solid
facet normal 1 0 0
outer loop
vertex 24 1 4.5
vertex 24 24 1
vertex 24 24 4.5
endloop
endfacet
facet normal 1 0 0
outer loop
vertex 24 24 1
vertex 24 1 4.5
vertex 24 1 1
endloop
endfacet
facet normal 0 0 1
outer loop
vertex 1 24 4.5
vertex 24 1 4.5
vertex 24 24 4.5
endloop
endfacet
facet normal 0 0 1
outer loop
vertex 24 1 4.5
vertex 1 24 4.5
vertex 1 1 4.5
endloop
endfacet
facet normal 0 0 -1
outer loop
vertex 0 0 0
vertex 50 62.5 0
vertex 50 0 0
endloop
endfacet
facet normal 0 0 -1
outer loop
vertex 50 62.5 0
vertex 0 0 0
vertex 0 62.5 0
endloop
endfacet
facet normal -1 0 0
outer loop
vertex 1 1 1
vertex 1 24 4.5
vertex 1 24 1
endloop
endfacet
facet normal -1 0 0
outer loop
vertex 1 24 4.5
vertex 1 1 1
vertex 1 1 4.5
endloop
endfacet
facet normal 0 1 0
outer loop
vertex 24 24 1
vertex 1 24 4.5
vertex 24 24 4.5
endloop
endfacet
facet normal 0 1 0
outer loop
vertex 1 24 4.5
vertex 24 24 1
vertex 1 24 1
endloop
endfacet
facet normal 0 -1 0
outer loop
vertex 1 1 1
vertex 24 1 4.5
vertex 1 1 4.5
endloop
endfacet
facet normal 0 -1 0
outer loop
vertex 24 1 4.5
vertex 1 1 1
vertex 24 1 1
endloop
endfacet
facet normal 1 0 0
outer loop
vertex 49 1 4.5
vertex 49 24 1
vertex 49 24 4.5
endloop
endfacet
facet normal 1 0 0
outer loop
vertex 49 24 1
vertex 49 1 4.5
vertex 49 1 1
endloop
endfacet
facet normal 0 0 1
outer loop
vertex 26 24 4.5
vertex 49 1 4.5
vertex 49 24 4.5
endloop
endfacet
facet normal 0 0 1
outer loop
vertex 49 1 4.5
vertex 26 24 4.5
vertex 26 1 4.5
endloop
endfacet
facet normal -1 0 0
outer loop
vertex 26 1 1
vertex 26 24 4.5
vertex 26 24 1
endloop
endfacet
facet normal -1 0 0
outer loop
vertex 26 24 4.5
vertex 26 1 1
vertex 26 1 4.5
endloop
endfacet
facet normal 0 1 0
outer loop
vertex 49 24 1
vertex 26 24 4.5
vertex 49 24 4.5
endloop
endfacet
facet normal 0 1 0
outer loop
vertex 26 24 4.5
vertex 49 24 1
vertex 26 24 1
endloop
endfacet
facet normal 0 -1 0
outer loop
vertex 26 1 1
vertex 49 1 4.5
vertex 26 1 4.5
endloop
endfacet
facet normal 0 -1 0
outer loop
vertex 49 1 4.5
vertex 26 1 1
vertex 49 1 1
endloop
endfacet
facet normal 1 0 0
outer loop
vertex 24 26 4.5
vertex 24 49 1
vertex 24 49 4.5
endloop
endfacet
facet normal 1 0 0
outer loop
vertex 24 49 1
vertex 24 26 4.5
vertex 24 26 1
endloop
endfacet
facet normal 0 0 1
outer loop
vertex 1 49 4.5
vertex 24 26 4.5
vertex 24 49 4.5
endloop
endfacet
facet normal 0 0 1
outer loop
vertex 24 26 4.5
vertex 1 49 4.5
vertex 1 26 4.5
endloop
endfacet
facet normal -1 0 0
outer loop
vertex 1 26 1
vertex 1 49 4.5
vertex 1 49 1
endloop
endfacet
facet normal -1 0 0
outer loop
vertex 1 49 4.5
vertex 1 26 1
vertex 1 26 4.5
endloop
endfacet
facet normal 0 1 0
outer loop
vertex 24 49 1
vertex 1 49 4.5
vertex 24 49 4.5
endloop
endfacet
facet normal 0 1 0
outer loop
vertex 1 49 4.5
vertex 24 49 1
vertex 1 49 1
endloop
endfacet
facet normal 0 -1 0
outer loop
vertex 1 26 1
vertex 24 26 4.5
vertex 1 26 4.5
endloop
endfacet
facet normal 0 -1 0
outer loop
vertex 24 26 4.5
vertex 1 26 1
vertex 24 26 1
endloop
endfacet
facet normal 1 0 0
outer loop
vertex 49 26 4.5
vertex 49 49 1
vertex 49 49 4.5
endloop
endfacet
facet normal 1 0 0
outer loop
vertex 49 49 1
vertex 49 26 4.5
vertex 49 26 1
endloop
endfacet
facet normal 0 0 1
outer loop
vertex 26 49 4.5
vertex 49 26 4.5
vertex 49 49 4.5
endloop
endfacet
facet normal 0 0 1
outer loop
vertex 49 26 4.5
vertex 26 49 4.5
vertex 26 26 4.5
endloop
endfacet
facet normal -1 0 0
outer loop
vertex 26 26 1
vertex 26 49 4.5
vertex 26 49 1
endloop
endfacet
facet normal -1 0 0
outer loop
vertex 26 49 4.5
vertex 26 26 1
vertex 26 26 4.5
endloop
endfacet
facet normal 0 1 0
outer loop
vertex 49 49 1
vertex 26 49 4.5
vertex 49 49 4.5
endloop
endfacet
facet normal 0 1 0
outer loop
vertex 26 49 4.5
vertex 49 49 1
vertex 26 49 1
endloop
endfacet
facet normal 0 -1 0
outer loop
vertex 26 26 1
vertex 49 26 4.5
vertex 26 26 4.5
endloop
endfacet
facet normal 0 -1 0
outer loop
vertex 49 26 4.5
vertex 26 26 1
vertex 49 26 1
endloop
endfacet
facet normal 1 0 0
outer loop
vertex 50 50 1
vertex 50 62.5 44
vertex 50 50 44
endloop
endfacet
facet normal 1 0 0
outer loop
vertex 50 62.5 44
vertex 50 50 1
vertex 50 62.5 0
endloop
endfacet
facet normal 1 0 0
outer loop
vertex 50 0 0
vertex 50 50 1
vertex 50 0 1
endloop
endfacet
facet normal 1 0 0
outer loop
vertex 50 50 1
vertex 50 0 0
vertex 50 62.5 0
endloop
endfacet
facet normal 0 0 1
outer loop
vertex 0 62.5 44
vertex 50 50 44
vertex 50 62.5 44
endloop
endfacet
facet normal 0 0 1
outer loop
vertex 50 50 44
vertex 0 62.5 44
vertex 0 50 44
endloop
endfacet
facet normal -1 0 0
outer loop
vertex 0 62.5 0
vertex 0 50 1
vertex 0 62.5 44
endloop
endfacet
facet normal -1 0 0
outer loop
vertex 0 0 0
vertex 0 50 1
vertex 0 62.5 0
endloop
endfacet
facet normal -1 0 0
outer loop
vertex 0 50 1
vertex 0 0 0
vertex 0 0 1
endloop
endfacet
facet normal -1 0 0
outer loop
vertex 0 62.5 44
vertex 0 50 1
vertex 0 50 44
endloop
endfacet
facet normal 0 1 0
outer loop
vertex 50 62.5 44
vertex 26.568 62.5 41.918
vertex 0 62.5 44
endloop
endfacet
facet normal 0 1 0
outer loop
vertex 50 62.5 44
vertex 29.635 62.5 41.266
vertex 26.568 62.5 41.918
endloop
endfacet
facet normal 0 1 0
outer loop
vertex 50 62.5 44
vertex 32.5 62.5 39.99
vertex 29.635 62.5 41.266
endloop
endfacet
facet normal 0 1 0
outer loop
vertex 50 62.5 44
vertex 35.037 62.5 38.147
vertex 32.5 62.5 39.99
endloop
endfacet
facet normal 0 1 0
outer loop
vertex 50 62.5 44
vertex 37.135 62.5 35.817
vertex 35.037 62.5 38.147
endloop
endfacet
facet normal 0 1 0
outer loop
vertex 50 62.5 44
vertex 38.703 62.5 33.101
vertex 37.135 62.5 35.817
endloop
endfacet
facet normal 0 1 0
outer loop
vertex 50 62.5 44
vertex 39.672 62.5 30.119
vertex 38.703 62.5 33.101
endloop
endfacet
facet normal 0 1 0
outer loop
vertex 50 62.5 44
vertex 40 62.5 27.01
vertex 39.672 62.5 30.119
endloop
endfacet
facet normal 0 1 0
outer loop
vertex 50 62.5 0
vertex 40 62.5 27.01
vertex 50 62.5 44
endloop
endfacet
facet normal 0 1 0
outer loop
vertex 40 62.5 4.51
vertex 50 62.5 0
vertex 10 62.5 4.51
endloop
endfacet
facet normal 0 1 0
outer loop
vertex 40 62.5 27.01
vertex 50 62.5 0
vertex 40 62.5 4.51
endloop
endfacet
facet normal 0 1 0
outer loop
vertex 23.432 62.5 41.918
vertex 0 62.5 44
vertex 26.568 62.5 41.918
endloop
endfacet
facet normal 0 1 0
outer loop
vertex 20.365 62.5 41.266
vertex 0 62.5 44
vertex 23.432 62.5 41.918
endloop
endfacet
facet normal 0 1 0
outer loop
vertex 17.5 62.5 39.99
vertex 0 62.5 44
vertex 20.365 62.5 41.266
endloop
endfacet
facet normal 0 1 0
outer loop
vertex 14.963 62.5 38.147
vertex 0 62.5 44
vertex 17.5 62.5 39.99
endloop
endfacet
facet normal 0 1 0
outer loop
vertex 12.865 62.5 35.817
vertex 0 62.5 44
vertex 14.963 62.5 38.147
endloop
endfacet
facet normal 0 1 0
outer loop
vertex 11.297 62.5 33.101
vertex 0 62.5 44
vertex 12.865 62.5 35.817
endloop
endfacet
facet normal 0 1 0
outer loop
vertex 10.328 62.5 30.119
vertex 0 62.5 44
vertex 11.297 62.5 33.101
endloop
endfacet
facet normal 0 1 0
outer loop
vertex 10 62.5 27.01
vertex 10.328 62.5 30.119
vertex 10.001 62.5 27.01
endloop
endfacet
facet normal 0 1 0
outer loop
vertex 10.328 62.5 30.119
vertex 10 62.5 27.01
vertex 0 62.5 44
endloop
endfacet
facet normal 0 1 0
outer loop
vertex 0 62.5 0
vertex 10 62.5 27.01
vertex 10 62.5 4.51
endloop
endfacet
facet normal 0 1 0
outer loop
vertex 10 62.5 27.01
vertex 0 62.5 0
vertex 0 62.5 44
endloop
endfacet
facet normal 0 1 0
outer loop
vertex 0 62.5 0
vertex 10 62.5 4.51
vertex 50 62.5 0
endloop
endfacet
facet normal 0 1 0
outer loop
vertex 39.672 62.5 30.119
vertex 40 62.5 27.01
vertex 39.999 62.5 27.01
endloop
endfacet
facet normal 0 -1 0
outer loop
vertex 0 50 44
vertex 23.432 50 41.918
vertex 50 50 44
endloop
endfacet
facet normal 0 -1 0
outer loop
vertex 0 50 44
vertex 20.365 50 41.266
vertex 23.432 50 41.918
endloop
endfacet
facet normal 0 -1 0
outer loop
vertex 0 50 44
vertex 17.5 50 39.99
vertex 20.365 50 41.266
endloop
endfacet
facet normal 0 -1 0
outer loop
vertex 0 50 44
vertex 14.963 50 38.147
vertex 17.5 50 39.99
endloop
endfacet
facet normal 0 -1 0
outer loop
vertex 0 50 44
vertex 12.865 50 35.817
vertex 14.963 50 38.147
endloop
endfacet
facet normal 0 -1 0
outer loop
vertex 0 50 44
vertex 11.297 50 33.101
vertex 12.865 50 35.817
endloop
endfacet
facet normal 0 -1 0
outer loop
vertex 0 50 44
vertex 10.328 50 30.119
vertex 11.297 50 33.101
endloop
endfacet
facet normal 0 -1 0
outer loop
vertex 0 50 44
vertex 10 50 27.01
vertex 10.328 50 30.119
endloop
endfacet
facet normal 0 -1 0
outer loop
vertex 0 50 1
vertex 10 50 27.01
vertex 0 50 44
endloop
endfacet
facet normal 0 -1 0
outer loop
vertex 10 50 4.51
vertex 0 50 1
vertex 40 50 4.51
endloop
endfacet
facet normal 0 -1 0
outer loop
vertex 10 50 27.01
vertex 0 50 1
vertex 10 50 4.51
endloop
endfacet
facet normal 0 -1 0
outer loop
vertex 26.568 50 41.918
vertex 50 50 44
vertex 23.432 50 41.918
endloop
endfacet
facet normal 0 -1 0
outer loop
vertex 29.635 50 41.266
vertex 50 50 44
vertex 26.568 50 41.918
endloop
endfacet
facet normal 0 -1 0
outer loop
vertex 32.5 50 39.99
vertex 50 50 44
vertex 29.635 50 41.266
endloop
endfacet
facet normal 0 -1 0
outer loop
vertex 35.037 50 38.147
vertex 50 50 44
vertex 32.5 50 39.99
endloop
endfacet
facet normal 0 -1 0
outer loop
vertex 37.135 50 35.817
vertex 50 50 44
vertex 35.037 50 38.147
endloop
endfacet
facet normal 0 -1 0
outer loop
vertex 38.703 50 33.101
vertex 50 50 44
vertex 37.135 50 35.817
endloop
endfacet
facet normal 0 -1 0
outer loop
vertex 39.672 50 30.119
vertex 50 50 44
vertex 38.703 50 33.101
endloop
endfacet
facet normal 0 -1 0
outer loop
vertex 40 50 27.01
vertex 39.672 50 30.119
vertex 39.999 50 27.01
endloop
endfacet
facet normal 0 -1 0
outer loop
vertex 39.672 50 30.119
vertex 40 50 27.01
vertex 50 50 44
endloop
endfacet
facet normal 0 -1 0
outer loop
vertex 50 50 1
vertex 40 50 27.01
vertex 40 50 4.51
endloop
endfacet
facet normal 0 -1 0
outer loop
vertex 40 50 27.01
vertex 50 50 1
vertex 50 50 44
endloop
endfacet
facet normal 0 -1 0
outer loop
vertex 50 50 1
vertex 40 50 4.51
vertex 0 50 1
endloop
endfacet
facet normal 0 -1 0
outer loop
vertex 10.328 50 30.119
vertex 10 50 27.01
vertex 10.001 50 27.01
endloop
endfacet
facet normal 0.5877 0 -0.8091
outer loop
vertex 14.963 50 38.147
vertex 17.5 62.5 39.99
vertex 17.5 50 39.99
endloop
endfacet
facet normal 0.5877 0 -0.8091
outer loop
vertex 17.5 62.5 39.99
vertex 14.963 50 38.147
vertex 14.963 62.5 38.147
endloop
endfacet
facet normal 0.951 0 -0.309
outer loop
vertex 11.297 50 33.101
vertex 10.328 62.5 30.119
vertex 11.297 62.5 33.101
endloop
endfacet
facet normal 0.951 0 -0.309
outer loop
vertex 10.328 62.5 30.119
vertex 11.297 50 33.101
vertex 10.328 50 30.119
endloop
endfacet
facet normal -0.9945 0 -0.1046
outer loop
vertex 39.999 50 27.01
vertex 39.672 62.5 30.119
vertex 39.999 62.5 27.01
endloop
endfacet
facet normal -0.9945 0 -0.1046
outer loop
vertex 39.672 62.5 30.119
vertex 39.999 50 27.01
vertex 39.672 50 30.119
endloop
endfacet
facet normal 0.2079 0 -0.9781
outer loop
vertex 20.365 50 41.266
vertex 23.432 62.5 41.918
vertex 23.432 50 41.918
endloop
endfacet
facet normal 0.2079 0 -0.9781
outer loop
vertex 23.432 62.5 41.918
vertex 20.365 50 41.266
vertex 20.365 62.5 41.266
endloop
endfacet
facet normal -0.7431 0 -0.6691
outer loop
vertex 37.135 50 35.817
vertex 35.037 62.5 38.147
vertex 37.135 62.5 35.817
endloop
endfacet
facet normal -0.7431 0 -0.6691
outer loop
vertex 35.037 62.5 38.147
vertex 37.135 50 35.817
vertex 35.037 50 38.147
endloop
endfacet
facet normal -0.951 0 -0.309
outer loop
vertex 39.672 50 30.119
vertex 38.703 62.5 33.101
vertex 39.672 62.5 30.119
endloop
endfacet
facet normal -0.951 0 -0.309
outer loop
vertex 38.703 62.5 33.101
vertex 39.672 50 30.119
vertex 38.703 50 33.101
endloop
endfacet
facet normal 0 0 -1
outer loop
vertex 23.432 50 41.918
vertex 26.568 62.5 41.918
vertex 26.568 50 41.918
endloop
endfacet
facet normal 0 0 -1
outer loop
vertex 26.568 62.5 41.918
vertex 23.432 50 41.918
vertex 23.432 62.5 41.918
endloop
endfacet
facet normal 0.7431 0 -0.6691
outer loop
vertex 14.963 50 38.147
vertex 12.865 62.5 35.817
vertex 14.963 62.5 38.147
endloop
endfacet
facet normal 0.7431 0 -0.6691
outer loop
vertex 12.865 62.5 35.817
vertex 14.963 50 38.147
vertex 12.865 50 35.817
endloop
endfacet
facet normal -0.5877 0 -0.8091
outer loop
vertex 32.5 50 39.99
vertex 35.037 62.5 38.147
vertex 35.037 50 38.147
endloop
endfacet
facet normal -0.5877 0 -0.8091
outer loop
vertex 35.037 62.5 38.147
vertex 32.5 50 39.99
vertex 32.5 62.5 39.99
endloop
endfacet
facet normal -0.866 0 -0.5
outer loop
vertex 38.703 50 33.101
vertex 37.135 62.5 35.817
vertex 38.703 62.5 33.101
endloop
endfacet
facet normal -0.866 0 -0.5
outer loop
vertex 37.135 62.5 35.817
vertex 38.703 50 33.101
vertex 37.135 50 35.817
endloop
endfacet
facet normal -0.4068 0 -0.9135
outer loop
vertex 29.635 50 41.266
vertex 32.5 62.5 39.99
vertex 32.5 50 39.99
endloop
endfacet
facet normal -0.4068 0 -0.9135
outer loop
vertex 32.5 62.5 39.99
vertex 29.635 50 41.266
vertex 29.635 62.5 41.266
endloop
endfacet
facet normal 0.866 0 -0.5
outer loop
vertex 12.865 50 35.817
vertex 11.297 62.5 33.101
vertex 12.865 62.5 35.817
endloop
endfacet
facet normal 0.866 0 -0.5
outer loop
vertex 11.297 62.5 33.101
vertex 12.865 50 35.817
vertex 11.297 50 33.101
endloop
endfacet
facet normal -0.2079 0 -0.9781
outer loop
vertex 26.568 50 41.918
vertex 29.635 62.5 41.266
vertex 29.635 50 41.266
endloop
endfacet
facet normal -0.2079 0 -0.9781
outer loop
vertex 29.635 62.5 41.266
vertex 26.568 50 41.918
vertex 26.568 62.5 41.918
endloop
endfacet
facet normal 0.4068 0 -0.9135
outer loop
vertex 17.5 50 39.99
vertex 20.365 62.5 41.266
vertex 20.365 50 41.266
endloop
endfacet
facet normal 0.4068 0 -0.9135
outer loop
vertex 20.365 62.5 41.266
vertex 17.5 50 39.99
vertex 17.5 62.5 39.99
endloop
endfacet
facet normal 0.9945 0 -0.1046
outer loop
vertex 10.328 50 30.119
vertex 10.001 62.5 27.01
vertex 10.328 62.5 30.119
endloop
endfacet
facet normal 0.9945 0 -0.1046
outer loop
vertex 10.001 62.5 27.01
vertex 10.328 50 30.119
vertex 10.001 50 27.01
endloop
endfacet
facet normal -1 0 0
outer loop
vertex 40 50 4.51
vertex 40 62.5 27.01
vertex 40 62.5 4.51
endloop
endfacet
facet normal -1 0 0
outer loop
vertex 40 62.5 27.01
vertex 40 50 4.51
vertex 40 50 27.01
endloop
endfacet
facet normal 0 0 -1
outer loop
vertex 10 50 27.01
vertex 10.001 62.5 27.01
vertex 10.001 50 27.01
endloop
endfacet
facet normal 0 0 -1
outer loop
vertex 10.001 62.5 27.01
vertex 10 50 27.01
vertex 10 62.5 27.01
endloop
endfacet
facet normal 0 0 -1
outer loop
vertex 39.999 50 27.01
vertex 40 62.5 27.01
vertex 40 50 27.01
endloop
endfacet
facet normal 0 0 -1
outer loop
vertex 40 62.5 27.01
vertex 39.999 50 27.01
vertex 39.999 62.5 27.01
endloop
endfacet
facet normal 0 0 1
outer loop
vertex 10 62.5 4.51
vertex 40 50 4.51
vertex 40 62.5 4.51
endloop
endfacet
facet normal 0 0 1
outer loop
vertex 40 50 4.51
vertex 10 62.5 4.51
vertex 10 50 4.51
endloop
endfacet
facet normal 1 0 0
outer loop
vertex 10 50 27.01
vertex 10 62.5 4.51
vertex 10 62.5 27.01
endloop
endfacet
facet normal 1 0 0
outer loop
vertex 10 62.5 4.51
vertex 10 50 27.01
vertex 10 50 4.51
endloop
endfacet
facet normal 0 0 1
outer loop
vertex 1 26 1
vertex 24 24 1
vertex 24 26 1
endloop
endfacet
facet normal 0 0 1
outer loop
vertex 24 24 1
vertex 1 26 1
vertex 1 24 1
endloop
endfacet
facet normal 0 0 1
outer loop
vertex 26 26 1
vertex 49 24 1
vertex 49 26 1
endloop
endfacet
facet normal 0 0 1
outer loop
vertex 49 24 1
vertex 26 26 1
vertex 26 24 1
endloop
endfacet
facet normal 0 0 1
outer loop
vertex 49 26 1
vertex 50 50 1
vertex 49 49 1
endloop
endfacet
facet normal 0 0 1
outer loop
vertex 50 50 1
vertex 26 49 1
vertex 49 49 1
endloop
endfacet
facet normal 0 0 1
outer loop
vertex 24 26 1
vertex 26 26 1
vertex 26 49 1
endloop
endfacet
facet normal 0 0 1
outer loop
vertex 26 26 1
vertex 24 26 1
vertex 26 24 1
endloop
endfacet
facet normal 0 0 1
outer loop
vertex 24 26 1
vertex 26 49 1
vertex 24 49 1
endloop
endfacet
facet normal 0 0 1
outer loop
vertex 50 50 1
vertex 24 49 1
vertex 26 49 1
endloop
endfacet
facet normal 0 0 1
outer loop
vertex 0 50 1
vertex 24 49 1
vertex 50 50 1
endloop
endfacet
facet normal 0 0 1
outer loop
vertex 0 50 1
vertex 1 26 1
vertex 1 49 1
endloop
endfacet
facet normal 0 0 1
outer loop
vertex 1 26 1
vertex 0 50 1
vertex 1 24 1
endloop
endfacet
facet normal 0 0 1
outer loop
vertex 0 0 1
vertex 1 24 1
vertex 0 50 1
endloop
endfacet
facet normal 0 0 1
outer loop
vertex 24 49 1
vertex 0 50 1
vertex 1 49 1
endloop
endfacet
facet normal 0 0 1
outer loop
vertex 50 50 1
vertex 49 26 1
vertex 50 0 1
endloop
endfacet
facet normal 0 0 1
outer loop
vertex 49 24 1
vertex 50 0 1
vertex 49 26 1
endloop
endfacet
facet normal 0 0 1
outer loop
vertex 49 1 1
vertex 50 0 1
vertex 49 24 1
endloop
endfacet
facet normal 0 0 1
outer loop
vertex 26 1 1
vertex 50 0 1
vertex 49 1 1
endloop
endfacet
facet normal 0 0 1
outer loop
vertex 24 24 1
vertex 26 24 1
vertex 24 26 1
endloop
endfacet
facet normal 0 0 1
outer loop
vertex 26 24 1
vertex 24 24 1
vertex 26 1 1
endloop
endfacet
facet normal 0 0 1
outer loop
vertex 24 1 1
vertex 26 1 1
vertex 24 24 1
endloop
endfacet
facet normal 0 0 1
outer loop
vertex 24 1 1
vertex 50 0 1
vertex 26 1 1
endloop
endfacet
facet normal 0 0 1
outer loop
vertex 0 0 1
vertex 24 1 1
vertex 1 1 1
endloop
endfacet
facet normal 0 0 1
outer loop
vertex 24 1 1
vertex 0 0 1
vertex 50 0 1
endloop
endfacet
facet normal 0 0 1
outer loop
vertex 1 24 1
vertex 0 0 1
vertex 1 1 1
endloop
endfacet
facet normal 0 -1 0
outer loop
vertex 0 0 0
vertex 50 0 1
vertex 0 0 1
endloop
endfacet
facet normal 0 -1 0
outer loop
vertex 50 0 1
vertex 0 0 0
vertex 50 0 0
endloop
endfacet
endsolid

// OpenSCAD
color("LightGray") {
    translate([1,1,0]) cube([23,23,4.5]);
    translate([25+1,1,0]) cube([23,23,4.5]);
    translate([1,25+1,0]) cube([23,23,4.5]);
    translate([25+1,25+1,0]) cube([23,23,4.5]);
}
color("Grey") {
    cube([50,50,1]);
    difference() {
        translate([0,50,0]) cube([50,12.5,50-6]);
        translate([25,25,27]) rotate([-90,0,0]) cylinder(50,15,15);
        translate([10,25,4.51]) cube([30,50,27-4.5]);
    }
}
